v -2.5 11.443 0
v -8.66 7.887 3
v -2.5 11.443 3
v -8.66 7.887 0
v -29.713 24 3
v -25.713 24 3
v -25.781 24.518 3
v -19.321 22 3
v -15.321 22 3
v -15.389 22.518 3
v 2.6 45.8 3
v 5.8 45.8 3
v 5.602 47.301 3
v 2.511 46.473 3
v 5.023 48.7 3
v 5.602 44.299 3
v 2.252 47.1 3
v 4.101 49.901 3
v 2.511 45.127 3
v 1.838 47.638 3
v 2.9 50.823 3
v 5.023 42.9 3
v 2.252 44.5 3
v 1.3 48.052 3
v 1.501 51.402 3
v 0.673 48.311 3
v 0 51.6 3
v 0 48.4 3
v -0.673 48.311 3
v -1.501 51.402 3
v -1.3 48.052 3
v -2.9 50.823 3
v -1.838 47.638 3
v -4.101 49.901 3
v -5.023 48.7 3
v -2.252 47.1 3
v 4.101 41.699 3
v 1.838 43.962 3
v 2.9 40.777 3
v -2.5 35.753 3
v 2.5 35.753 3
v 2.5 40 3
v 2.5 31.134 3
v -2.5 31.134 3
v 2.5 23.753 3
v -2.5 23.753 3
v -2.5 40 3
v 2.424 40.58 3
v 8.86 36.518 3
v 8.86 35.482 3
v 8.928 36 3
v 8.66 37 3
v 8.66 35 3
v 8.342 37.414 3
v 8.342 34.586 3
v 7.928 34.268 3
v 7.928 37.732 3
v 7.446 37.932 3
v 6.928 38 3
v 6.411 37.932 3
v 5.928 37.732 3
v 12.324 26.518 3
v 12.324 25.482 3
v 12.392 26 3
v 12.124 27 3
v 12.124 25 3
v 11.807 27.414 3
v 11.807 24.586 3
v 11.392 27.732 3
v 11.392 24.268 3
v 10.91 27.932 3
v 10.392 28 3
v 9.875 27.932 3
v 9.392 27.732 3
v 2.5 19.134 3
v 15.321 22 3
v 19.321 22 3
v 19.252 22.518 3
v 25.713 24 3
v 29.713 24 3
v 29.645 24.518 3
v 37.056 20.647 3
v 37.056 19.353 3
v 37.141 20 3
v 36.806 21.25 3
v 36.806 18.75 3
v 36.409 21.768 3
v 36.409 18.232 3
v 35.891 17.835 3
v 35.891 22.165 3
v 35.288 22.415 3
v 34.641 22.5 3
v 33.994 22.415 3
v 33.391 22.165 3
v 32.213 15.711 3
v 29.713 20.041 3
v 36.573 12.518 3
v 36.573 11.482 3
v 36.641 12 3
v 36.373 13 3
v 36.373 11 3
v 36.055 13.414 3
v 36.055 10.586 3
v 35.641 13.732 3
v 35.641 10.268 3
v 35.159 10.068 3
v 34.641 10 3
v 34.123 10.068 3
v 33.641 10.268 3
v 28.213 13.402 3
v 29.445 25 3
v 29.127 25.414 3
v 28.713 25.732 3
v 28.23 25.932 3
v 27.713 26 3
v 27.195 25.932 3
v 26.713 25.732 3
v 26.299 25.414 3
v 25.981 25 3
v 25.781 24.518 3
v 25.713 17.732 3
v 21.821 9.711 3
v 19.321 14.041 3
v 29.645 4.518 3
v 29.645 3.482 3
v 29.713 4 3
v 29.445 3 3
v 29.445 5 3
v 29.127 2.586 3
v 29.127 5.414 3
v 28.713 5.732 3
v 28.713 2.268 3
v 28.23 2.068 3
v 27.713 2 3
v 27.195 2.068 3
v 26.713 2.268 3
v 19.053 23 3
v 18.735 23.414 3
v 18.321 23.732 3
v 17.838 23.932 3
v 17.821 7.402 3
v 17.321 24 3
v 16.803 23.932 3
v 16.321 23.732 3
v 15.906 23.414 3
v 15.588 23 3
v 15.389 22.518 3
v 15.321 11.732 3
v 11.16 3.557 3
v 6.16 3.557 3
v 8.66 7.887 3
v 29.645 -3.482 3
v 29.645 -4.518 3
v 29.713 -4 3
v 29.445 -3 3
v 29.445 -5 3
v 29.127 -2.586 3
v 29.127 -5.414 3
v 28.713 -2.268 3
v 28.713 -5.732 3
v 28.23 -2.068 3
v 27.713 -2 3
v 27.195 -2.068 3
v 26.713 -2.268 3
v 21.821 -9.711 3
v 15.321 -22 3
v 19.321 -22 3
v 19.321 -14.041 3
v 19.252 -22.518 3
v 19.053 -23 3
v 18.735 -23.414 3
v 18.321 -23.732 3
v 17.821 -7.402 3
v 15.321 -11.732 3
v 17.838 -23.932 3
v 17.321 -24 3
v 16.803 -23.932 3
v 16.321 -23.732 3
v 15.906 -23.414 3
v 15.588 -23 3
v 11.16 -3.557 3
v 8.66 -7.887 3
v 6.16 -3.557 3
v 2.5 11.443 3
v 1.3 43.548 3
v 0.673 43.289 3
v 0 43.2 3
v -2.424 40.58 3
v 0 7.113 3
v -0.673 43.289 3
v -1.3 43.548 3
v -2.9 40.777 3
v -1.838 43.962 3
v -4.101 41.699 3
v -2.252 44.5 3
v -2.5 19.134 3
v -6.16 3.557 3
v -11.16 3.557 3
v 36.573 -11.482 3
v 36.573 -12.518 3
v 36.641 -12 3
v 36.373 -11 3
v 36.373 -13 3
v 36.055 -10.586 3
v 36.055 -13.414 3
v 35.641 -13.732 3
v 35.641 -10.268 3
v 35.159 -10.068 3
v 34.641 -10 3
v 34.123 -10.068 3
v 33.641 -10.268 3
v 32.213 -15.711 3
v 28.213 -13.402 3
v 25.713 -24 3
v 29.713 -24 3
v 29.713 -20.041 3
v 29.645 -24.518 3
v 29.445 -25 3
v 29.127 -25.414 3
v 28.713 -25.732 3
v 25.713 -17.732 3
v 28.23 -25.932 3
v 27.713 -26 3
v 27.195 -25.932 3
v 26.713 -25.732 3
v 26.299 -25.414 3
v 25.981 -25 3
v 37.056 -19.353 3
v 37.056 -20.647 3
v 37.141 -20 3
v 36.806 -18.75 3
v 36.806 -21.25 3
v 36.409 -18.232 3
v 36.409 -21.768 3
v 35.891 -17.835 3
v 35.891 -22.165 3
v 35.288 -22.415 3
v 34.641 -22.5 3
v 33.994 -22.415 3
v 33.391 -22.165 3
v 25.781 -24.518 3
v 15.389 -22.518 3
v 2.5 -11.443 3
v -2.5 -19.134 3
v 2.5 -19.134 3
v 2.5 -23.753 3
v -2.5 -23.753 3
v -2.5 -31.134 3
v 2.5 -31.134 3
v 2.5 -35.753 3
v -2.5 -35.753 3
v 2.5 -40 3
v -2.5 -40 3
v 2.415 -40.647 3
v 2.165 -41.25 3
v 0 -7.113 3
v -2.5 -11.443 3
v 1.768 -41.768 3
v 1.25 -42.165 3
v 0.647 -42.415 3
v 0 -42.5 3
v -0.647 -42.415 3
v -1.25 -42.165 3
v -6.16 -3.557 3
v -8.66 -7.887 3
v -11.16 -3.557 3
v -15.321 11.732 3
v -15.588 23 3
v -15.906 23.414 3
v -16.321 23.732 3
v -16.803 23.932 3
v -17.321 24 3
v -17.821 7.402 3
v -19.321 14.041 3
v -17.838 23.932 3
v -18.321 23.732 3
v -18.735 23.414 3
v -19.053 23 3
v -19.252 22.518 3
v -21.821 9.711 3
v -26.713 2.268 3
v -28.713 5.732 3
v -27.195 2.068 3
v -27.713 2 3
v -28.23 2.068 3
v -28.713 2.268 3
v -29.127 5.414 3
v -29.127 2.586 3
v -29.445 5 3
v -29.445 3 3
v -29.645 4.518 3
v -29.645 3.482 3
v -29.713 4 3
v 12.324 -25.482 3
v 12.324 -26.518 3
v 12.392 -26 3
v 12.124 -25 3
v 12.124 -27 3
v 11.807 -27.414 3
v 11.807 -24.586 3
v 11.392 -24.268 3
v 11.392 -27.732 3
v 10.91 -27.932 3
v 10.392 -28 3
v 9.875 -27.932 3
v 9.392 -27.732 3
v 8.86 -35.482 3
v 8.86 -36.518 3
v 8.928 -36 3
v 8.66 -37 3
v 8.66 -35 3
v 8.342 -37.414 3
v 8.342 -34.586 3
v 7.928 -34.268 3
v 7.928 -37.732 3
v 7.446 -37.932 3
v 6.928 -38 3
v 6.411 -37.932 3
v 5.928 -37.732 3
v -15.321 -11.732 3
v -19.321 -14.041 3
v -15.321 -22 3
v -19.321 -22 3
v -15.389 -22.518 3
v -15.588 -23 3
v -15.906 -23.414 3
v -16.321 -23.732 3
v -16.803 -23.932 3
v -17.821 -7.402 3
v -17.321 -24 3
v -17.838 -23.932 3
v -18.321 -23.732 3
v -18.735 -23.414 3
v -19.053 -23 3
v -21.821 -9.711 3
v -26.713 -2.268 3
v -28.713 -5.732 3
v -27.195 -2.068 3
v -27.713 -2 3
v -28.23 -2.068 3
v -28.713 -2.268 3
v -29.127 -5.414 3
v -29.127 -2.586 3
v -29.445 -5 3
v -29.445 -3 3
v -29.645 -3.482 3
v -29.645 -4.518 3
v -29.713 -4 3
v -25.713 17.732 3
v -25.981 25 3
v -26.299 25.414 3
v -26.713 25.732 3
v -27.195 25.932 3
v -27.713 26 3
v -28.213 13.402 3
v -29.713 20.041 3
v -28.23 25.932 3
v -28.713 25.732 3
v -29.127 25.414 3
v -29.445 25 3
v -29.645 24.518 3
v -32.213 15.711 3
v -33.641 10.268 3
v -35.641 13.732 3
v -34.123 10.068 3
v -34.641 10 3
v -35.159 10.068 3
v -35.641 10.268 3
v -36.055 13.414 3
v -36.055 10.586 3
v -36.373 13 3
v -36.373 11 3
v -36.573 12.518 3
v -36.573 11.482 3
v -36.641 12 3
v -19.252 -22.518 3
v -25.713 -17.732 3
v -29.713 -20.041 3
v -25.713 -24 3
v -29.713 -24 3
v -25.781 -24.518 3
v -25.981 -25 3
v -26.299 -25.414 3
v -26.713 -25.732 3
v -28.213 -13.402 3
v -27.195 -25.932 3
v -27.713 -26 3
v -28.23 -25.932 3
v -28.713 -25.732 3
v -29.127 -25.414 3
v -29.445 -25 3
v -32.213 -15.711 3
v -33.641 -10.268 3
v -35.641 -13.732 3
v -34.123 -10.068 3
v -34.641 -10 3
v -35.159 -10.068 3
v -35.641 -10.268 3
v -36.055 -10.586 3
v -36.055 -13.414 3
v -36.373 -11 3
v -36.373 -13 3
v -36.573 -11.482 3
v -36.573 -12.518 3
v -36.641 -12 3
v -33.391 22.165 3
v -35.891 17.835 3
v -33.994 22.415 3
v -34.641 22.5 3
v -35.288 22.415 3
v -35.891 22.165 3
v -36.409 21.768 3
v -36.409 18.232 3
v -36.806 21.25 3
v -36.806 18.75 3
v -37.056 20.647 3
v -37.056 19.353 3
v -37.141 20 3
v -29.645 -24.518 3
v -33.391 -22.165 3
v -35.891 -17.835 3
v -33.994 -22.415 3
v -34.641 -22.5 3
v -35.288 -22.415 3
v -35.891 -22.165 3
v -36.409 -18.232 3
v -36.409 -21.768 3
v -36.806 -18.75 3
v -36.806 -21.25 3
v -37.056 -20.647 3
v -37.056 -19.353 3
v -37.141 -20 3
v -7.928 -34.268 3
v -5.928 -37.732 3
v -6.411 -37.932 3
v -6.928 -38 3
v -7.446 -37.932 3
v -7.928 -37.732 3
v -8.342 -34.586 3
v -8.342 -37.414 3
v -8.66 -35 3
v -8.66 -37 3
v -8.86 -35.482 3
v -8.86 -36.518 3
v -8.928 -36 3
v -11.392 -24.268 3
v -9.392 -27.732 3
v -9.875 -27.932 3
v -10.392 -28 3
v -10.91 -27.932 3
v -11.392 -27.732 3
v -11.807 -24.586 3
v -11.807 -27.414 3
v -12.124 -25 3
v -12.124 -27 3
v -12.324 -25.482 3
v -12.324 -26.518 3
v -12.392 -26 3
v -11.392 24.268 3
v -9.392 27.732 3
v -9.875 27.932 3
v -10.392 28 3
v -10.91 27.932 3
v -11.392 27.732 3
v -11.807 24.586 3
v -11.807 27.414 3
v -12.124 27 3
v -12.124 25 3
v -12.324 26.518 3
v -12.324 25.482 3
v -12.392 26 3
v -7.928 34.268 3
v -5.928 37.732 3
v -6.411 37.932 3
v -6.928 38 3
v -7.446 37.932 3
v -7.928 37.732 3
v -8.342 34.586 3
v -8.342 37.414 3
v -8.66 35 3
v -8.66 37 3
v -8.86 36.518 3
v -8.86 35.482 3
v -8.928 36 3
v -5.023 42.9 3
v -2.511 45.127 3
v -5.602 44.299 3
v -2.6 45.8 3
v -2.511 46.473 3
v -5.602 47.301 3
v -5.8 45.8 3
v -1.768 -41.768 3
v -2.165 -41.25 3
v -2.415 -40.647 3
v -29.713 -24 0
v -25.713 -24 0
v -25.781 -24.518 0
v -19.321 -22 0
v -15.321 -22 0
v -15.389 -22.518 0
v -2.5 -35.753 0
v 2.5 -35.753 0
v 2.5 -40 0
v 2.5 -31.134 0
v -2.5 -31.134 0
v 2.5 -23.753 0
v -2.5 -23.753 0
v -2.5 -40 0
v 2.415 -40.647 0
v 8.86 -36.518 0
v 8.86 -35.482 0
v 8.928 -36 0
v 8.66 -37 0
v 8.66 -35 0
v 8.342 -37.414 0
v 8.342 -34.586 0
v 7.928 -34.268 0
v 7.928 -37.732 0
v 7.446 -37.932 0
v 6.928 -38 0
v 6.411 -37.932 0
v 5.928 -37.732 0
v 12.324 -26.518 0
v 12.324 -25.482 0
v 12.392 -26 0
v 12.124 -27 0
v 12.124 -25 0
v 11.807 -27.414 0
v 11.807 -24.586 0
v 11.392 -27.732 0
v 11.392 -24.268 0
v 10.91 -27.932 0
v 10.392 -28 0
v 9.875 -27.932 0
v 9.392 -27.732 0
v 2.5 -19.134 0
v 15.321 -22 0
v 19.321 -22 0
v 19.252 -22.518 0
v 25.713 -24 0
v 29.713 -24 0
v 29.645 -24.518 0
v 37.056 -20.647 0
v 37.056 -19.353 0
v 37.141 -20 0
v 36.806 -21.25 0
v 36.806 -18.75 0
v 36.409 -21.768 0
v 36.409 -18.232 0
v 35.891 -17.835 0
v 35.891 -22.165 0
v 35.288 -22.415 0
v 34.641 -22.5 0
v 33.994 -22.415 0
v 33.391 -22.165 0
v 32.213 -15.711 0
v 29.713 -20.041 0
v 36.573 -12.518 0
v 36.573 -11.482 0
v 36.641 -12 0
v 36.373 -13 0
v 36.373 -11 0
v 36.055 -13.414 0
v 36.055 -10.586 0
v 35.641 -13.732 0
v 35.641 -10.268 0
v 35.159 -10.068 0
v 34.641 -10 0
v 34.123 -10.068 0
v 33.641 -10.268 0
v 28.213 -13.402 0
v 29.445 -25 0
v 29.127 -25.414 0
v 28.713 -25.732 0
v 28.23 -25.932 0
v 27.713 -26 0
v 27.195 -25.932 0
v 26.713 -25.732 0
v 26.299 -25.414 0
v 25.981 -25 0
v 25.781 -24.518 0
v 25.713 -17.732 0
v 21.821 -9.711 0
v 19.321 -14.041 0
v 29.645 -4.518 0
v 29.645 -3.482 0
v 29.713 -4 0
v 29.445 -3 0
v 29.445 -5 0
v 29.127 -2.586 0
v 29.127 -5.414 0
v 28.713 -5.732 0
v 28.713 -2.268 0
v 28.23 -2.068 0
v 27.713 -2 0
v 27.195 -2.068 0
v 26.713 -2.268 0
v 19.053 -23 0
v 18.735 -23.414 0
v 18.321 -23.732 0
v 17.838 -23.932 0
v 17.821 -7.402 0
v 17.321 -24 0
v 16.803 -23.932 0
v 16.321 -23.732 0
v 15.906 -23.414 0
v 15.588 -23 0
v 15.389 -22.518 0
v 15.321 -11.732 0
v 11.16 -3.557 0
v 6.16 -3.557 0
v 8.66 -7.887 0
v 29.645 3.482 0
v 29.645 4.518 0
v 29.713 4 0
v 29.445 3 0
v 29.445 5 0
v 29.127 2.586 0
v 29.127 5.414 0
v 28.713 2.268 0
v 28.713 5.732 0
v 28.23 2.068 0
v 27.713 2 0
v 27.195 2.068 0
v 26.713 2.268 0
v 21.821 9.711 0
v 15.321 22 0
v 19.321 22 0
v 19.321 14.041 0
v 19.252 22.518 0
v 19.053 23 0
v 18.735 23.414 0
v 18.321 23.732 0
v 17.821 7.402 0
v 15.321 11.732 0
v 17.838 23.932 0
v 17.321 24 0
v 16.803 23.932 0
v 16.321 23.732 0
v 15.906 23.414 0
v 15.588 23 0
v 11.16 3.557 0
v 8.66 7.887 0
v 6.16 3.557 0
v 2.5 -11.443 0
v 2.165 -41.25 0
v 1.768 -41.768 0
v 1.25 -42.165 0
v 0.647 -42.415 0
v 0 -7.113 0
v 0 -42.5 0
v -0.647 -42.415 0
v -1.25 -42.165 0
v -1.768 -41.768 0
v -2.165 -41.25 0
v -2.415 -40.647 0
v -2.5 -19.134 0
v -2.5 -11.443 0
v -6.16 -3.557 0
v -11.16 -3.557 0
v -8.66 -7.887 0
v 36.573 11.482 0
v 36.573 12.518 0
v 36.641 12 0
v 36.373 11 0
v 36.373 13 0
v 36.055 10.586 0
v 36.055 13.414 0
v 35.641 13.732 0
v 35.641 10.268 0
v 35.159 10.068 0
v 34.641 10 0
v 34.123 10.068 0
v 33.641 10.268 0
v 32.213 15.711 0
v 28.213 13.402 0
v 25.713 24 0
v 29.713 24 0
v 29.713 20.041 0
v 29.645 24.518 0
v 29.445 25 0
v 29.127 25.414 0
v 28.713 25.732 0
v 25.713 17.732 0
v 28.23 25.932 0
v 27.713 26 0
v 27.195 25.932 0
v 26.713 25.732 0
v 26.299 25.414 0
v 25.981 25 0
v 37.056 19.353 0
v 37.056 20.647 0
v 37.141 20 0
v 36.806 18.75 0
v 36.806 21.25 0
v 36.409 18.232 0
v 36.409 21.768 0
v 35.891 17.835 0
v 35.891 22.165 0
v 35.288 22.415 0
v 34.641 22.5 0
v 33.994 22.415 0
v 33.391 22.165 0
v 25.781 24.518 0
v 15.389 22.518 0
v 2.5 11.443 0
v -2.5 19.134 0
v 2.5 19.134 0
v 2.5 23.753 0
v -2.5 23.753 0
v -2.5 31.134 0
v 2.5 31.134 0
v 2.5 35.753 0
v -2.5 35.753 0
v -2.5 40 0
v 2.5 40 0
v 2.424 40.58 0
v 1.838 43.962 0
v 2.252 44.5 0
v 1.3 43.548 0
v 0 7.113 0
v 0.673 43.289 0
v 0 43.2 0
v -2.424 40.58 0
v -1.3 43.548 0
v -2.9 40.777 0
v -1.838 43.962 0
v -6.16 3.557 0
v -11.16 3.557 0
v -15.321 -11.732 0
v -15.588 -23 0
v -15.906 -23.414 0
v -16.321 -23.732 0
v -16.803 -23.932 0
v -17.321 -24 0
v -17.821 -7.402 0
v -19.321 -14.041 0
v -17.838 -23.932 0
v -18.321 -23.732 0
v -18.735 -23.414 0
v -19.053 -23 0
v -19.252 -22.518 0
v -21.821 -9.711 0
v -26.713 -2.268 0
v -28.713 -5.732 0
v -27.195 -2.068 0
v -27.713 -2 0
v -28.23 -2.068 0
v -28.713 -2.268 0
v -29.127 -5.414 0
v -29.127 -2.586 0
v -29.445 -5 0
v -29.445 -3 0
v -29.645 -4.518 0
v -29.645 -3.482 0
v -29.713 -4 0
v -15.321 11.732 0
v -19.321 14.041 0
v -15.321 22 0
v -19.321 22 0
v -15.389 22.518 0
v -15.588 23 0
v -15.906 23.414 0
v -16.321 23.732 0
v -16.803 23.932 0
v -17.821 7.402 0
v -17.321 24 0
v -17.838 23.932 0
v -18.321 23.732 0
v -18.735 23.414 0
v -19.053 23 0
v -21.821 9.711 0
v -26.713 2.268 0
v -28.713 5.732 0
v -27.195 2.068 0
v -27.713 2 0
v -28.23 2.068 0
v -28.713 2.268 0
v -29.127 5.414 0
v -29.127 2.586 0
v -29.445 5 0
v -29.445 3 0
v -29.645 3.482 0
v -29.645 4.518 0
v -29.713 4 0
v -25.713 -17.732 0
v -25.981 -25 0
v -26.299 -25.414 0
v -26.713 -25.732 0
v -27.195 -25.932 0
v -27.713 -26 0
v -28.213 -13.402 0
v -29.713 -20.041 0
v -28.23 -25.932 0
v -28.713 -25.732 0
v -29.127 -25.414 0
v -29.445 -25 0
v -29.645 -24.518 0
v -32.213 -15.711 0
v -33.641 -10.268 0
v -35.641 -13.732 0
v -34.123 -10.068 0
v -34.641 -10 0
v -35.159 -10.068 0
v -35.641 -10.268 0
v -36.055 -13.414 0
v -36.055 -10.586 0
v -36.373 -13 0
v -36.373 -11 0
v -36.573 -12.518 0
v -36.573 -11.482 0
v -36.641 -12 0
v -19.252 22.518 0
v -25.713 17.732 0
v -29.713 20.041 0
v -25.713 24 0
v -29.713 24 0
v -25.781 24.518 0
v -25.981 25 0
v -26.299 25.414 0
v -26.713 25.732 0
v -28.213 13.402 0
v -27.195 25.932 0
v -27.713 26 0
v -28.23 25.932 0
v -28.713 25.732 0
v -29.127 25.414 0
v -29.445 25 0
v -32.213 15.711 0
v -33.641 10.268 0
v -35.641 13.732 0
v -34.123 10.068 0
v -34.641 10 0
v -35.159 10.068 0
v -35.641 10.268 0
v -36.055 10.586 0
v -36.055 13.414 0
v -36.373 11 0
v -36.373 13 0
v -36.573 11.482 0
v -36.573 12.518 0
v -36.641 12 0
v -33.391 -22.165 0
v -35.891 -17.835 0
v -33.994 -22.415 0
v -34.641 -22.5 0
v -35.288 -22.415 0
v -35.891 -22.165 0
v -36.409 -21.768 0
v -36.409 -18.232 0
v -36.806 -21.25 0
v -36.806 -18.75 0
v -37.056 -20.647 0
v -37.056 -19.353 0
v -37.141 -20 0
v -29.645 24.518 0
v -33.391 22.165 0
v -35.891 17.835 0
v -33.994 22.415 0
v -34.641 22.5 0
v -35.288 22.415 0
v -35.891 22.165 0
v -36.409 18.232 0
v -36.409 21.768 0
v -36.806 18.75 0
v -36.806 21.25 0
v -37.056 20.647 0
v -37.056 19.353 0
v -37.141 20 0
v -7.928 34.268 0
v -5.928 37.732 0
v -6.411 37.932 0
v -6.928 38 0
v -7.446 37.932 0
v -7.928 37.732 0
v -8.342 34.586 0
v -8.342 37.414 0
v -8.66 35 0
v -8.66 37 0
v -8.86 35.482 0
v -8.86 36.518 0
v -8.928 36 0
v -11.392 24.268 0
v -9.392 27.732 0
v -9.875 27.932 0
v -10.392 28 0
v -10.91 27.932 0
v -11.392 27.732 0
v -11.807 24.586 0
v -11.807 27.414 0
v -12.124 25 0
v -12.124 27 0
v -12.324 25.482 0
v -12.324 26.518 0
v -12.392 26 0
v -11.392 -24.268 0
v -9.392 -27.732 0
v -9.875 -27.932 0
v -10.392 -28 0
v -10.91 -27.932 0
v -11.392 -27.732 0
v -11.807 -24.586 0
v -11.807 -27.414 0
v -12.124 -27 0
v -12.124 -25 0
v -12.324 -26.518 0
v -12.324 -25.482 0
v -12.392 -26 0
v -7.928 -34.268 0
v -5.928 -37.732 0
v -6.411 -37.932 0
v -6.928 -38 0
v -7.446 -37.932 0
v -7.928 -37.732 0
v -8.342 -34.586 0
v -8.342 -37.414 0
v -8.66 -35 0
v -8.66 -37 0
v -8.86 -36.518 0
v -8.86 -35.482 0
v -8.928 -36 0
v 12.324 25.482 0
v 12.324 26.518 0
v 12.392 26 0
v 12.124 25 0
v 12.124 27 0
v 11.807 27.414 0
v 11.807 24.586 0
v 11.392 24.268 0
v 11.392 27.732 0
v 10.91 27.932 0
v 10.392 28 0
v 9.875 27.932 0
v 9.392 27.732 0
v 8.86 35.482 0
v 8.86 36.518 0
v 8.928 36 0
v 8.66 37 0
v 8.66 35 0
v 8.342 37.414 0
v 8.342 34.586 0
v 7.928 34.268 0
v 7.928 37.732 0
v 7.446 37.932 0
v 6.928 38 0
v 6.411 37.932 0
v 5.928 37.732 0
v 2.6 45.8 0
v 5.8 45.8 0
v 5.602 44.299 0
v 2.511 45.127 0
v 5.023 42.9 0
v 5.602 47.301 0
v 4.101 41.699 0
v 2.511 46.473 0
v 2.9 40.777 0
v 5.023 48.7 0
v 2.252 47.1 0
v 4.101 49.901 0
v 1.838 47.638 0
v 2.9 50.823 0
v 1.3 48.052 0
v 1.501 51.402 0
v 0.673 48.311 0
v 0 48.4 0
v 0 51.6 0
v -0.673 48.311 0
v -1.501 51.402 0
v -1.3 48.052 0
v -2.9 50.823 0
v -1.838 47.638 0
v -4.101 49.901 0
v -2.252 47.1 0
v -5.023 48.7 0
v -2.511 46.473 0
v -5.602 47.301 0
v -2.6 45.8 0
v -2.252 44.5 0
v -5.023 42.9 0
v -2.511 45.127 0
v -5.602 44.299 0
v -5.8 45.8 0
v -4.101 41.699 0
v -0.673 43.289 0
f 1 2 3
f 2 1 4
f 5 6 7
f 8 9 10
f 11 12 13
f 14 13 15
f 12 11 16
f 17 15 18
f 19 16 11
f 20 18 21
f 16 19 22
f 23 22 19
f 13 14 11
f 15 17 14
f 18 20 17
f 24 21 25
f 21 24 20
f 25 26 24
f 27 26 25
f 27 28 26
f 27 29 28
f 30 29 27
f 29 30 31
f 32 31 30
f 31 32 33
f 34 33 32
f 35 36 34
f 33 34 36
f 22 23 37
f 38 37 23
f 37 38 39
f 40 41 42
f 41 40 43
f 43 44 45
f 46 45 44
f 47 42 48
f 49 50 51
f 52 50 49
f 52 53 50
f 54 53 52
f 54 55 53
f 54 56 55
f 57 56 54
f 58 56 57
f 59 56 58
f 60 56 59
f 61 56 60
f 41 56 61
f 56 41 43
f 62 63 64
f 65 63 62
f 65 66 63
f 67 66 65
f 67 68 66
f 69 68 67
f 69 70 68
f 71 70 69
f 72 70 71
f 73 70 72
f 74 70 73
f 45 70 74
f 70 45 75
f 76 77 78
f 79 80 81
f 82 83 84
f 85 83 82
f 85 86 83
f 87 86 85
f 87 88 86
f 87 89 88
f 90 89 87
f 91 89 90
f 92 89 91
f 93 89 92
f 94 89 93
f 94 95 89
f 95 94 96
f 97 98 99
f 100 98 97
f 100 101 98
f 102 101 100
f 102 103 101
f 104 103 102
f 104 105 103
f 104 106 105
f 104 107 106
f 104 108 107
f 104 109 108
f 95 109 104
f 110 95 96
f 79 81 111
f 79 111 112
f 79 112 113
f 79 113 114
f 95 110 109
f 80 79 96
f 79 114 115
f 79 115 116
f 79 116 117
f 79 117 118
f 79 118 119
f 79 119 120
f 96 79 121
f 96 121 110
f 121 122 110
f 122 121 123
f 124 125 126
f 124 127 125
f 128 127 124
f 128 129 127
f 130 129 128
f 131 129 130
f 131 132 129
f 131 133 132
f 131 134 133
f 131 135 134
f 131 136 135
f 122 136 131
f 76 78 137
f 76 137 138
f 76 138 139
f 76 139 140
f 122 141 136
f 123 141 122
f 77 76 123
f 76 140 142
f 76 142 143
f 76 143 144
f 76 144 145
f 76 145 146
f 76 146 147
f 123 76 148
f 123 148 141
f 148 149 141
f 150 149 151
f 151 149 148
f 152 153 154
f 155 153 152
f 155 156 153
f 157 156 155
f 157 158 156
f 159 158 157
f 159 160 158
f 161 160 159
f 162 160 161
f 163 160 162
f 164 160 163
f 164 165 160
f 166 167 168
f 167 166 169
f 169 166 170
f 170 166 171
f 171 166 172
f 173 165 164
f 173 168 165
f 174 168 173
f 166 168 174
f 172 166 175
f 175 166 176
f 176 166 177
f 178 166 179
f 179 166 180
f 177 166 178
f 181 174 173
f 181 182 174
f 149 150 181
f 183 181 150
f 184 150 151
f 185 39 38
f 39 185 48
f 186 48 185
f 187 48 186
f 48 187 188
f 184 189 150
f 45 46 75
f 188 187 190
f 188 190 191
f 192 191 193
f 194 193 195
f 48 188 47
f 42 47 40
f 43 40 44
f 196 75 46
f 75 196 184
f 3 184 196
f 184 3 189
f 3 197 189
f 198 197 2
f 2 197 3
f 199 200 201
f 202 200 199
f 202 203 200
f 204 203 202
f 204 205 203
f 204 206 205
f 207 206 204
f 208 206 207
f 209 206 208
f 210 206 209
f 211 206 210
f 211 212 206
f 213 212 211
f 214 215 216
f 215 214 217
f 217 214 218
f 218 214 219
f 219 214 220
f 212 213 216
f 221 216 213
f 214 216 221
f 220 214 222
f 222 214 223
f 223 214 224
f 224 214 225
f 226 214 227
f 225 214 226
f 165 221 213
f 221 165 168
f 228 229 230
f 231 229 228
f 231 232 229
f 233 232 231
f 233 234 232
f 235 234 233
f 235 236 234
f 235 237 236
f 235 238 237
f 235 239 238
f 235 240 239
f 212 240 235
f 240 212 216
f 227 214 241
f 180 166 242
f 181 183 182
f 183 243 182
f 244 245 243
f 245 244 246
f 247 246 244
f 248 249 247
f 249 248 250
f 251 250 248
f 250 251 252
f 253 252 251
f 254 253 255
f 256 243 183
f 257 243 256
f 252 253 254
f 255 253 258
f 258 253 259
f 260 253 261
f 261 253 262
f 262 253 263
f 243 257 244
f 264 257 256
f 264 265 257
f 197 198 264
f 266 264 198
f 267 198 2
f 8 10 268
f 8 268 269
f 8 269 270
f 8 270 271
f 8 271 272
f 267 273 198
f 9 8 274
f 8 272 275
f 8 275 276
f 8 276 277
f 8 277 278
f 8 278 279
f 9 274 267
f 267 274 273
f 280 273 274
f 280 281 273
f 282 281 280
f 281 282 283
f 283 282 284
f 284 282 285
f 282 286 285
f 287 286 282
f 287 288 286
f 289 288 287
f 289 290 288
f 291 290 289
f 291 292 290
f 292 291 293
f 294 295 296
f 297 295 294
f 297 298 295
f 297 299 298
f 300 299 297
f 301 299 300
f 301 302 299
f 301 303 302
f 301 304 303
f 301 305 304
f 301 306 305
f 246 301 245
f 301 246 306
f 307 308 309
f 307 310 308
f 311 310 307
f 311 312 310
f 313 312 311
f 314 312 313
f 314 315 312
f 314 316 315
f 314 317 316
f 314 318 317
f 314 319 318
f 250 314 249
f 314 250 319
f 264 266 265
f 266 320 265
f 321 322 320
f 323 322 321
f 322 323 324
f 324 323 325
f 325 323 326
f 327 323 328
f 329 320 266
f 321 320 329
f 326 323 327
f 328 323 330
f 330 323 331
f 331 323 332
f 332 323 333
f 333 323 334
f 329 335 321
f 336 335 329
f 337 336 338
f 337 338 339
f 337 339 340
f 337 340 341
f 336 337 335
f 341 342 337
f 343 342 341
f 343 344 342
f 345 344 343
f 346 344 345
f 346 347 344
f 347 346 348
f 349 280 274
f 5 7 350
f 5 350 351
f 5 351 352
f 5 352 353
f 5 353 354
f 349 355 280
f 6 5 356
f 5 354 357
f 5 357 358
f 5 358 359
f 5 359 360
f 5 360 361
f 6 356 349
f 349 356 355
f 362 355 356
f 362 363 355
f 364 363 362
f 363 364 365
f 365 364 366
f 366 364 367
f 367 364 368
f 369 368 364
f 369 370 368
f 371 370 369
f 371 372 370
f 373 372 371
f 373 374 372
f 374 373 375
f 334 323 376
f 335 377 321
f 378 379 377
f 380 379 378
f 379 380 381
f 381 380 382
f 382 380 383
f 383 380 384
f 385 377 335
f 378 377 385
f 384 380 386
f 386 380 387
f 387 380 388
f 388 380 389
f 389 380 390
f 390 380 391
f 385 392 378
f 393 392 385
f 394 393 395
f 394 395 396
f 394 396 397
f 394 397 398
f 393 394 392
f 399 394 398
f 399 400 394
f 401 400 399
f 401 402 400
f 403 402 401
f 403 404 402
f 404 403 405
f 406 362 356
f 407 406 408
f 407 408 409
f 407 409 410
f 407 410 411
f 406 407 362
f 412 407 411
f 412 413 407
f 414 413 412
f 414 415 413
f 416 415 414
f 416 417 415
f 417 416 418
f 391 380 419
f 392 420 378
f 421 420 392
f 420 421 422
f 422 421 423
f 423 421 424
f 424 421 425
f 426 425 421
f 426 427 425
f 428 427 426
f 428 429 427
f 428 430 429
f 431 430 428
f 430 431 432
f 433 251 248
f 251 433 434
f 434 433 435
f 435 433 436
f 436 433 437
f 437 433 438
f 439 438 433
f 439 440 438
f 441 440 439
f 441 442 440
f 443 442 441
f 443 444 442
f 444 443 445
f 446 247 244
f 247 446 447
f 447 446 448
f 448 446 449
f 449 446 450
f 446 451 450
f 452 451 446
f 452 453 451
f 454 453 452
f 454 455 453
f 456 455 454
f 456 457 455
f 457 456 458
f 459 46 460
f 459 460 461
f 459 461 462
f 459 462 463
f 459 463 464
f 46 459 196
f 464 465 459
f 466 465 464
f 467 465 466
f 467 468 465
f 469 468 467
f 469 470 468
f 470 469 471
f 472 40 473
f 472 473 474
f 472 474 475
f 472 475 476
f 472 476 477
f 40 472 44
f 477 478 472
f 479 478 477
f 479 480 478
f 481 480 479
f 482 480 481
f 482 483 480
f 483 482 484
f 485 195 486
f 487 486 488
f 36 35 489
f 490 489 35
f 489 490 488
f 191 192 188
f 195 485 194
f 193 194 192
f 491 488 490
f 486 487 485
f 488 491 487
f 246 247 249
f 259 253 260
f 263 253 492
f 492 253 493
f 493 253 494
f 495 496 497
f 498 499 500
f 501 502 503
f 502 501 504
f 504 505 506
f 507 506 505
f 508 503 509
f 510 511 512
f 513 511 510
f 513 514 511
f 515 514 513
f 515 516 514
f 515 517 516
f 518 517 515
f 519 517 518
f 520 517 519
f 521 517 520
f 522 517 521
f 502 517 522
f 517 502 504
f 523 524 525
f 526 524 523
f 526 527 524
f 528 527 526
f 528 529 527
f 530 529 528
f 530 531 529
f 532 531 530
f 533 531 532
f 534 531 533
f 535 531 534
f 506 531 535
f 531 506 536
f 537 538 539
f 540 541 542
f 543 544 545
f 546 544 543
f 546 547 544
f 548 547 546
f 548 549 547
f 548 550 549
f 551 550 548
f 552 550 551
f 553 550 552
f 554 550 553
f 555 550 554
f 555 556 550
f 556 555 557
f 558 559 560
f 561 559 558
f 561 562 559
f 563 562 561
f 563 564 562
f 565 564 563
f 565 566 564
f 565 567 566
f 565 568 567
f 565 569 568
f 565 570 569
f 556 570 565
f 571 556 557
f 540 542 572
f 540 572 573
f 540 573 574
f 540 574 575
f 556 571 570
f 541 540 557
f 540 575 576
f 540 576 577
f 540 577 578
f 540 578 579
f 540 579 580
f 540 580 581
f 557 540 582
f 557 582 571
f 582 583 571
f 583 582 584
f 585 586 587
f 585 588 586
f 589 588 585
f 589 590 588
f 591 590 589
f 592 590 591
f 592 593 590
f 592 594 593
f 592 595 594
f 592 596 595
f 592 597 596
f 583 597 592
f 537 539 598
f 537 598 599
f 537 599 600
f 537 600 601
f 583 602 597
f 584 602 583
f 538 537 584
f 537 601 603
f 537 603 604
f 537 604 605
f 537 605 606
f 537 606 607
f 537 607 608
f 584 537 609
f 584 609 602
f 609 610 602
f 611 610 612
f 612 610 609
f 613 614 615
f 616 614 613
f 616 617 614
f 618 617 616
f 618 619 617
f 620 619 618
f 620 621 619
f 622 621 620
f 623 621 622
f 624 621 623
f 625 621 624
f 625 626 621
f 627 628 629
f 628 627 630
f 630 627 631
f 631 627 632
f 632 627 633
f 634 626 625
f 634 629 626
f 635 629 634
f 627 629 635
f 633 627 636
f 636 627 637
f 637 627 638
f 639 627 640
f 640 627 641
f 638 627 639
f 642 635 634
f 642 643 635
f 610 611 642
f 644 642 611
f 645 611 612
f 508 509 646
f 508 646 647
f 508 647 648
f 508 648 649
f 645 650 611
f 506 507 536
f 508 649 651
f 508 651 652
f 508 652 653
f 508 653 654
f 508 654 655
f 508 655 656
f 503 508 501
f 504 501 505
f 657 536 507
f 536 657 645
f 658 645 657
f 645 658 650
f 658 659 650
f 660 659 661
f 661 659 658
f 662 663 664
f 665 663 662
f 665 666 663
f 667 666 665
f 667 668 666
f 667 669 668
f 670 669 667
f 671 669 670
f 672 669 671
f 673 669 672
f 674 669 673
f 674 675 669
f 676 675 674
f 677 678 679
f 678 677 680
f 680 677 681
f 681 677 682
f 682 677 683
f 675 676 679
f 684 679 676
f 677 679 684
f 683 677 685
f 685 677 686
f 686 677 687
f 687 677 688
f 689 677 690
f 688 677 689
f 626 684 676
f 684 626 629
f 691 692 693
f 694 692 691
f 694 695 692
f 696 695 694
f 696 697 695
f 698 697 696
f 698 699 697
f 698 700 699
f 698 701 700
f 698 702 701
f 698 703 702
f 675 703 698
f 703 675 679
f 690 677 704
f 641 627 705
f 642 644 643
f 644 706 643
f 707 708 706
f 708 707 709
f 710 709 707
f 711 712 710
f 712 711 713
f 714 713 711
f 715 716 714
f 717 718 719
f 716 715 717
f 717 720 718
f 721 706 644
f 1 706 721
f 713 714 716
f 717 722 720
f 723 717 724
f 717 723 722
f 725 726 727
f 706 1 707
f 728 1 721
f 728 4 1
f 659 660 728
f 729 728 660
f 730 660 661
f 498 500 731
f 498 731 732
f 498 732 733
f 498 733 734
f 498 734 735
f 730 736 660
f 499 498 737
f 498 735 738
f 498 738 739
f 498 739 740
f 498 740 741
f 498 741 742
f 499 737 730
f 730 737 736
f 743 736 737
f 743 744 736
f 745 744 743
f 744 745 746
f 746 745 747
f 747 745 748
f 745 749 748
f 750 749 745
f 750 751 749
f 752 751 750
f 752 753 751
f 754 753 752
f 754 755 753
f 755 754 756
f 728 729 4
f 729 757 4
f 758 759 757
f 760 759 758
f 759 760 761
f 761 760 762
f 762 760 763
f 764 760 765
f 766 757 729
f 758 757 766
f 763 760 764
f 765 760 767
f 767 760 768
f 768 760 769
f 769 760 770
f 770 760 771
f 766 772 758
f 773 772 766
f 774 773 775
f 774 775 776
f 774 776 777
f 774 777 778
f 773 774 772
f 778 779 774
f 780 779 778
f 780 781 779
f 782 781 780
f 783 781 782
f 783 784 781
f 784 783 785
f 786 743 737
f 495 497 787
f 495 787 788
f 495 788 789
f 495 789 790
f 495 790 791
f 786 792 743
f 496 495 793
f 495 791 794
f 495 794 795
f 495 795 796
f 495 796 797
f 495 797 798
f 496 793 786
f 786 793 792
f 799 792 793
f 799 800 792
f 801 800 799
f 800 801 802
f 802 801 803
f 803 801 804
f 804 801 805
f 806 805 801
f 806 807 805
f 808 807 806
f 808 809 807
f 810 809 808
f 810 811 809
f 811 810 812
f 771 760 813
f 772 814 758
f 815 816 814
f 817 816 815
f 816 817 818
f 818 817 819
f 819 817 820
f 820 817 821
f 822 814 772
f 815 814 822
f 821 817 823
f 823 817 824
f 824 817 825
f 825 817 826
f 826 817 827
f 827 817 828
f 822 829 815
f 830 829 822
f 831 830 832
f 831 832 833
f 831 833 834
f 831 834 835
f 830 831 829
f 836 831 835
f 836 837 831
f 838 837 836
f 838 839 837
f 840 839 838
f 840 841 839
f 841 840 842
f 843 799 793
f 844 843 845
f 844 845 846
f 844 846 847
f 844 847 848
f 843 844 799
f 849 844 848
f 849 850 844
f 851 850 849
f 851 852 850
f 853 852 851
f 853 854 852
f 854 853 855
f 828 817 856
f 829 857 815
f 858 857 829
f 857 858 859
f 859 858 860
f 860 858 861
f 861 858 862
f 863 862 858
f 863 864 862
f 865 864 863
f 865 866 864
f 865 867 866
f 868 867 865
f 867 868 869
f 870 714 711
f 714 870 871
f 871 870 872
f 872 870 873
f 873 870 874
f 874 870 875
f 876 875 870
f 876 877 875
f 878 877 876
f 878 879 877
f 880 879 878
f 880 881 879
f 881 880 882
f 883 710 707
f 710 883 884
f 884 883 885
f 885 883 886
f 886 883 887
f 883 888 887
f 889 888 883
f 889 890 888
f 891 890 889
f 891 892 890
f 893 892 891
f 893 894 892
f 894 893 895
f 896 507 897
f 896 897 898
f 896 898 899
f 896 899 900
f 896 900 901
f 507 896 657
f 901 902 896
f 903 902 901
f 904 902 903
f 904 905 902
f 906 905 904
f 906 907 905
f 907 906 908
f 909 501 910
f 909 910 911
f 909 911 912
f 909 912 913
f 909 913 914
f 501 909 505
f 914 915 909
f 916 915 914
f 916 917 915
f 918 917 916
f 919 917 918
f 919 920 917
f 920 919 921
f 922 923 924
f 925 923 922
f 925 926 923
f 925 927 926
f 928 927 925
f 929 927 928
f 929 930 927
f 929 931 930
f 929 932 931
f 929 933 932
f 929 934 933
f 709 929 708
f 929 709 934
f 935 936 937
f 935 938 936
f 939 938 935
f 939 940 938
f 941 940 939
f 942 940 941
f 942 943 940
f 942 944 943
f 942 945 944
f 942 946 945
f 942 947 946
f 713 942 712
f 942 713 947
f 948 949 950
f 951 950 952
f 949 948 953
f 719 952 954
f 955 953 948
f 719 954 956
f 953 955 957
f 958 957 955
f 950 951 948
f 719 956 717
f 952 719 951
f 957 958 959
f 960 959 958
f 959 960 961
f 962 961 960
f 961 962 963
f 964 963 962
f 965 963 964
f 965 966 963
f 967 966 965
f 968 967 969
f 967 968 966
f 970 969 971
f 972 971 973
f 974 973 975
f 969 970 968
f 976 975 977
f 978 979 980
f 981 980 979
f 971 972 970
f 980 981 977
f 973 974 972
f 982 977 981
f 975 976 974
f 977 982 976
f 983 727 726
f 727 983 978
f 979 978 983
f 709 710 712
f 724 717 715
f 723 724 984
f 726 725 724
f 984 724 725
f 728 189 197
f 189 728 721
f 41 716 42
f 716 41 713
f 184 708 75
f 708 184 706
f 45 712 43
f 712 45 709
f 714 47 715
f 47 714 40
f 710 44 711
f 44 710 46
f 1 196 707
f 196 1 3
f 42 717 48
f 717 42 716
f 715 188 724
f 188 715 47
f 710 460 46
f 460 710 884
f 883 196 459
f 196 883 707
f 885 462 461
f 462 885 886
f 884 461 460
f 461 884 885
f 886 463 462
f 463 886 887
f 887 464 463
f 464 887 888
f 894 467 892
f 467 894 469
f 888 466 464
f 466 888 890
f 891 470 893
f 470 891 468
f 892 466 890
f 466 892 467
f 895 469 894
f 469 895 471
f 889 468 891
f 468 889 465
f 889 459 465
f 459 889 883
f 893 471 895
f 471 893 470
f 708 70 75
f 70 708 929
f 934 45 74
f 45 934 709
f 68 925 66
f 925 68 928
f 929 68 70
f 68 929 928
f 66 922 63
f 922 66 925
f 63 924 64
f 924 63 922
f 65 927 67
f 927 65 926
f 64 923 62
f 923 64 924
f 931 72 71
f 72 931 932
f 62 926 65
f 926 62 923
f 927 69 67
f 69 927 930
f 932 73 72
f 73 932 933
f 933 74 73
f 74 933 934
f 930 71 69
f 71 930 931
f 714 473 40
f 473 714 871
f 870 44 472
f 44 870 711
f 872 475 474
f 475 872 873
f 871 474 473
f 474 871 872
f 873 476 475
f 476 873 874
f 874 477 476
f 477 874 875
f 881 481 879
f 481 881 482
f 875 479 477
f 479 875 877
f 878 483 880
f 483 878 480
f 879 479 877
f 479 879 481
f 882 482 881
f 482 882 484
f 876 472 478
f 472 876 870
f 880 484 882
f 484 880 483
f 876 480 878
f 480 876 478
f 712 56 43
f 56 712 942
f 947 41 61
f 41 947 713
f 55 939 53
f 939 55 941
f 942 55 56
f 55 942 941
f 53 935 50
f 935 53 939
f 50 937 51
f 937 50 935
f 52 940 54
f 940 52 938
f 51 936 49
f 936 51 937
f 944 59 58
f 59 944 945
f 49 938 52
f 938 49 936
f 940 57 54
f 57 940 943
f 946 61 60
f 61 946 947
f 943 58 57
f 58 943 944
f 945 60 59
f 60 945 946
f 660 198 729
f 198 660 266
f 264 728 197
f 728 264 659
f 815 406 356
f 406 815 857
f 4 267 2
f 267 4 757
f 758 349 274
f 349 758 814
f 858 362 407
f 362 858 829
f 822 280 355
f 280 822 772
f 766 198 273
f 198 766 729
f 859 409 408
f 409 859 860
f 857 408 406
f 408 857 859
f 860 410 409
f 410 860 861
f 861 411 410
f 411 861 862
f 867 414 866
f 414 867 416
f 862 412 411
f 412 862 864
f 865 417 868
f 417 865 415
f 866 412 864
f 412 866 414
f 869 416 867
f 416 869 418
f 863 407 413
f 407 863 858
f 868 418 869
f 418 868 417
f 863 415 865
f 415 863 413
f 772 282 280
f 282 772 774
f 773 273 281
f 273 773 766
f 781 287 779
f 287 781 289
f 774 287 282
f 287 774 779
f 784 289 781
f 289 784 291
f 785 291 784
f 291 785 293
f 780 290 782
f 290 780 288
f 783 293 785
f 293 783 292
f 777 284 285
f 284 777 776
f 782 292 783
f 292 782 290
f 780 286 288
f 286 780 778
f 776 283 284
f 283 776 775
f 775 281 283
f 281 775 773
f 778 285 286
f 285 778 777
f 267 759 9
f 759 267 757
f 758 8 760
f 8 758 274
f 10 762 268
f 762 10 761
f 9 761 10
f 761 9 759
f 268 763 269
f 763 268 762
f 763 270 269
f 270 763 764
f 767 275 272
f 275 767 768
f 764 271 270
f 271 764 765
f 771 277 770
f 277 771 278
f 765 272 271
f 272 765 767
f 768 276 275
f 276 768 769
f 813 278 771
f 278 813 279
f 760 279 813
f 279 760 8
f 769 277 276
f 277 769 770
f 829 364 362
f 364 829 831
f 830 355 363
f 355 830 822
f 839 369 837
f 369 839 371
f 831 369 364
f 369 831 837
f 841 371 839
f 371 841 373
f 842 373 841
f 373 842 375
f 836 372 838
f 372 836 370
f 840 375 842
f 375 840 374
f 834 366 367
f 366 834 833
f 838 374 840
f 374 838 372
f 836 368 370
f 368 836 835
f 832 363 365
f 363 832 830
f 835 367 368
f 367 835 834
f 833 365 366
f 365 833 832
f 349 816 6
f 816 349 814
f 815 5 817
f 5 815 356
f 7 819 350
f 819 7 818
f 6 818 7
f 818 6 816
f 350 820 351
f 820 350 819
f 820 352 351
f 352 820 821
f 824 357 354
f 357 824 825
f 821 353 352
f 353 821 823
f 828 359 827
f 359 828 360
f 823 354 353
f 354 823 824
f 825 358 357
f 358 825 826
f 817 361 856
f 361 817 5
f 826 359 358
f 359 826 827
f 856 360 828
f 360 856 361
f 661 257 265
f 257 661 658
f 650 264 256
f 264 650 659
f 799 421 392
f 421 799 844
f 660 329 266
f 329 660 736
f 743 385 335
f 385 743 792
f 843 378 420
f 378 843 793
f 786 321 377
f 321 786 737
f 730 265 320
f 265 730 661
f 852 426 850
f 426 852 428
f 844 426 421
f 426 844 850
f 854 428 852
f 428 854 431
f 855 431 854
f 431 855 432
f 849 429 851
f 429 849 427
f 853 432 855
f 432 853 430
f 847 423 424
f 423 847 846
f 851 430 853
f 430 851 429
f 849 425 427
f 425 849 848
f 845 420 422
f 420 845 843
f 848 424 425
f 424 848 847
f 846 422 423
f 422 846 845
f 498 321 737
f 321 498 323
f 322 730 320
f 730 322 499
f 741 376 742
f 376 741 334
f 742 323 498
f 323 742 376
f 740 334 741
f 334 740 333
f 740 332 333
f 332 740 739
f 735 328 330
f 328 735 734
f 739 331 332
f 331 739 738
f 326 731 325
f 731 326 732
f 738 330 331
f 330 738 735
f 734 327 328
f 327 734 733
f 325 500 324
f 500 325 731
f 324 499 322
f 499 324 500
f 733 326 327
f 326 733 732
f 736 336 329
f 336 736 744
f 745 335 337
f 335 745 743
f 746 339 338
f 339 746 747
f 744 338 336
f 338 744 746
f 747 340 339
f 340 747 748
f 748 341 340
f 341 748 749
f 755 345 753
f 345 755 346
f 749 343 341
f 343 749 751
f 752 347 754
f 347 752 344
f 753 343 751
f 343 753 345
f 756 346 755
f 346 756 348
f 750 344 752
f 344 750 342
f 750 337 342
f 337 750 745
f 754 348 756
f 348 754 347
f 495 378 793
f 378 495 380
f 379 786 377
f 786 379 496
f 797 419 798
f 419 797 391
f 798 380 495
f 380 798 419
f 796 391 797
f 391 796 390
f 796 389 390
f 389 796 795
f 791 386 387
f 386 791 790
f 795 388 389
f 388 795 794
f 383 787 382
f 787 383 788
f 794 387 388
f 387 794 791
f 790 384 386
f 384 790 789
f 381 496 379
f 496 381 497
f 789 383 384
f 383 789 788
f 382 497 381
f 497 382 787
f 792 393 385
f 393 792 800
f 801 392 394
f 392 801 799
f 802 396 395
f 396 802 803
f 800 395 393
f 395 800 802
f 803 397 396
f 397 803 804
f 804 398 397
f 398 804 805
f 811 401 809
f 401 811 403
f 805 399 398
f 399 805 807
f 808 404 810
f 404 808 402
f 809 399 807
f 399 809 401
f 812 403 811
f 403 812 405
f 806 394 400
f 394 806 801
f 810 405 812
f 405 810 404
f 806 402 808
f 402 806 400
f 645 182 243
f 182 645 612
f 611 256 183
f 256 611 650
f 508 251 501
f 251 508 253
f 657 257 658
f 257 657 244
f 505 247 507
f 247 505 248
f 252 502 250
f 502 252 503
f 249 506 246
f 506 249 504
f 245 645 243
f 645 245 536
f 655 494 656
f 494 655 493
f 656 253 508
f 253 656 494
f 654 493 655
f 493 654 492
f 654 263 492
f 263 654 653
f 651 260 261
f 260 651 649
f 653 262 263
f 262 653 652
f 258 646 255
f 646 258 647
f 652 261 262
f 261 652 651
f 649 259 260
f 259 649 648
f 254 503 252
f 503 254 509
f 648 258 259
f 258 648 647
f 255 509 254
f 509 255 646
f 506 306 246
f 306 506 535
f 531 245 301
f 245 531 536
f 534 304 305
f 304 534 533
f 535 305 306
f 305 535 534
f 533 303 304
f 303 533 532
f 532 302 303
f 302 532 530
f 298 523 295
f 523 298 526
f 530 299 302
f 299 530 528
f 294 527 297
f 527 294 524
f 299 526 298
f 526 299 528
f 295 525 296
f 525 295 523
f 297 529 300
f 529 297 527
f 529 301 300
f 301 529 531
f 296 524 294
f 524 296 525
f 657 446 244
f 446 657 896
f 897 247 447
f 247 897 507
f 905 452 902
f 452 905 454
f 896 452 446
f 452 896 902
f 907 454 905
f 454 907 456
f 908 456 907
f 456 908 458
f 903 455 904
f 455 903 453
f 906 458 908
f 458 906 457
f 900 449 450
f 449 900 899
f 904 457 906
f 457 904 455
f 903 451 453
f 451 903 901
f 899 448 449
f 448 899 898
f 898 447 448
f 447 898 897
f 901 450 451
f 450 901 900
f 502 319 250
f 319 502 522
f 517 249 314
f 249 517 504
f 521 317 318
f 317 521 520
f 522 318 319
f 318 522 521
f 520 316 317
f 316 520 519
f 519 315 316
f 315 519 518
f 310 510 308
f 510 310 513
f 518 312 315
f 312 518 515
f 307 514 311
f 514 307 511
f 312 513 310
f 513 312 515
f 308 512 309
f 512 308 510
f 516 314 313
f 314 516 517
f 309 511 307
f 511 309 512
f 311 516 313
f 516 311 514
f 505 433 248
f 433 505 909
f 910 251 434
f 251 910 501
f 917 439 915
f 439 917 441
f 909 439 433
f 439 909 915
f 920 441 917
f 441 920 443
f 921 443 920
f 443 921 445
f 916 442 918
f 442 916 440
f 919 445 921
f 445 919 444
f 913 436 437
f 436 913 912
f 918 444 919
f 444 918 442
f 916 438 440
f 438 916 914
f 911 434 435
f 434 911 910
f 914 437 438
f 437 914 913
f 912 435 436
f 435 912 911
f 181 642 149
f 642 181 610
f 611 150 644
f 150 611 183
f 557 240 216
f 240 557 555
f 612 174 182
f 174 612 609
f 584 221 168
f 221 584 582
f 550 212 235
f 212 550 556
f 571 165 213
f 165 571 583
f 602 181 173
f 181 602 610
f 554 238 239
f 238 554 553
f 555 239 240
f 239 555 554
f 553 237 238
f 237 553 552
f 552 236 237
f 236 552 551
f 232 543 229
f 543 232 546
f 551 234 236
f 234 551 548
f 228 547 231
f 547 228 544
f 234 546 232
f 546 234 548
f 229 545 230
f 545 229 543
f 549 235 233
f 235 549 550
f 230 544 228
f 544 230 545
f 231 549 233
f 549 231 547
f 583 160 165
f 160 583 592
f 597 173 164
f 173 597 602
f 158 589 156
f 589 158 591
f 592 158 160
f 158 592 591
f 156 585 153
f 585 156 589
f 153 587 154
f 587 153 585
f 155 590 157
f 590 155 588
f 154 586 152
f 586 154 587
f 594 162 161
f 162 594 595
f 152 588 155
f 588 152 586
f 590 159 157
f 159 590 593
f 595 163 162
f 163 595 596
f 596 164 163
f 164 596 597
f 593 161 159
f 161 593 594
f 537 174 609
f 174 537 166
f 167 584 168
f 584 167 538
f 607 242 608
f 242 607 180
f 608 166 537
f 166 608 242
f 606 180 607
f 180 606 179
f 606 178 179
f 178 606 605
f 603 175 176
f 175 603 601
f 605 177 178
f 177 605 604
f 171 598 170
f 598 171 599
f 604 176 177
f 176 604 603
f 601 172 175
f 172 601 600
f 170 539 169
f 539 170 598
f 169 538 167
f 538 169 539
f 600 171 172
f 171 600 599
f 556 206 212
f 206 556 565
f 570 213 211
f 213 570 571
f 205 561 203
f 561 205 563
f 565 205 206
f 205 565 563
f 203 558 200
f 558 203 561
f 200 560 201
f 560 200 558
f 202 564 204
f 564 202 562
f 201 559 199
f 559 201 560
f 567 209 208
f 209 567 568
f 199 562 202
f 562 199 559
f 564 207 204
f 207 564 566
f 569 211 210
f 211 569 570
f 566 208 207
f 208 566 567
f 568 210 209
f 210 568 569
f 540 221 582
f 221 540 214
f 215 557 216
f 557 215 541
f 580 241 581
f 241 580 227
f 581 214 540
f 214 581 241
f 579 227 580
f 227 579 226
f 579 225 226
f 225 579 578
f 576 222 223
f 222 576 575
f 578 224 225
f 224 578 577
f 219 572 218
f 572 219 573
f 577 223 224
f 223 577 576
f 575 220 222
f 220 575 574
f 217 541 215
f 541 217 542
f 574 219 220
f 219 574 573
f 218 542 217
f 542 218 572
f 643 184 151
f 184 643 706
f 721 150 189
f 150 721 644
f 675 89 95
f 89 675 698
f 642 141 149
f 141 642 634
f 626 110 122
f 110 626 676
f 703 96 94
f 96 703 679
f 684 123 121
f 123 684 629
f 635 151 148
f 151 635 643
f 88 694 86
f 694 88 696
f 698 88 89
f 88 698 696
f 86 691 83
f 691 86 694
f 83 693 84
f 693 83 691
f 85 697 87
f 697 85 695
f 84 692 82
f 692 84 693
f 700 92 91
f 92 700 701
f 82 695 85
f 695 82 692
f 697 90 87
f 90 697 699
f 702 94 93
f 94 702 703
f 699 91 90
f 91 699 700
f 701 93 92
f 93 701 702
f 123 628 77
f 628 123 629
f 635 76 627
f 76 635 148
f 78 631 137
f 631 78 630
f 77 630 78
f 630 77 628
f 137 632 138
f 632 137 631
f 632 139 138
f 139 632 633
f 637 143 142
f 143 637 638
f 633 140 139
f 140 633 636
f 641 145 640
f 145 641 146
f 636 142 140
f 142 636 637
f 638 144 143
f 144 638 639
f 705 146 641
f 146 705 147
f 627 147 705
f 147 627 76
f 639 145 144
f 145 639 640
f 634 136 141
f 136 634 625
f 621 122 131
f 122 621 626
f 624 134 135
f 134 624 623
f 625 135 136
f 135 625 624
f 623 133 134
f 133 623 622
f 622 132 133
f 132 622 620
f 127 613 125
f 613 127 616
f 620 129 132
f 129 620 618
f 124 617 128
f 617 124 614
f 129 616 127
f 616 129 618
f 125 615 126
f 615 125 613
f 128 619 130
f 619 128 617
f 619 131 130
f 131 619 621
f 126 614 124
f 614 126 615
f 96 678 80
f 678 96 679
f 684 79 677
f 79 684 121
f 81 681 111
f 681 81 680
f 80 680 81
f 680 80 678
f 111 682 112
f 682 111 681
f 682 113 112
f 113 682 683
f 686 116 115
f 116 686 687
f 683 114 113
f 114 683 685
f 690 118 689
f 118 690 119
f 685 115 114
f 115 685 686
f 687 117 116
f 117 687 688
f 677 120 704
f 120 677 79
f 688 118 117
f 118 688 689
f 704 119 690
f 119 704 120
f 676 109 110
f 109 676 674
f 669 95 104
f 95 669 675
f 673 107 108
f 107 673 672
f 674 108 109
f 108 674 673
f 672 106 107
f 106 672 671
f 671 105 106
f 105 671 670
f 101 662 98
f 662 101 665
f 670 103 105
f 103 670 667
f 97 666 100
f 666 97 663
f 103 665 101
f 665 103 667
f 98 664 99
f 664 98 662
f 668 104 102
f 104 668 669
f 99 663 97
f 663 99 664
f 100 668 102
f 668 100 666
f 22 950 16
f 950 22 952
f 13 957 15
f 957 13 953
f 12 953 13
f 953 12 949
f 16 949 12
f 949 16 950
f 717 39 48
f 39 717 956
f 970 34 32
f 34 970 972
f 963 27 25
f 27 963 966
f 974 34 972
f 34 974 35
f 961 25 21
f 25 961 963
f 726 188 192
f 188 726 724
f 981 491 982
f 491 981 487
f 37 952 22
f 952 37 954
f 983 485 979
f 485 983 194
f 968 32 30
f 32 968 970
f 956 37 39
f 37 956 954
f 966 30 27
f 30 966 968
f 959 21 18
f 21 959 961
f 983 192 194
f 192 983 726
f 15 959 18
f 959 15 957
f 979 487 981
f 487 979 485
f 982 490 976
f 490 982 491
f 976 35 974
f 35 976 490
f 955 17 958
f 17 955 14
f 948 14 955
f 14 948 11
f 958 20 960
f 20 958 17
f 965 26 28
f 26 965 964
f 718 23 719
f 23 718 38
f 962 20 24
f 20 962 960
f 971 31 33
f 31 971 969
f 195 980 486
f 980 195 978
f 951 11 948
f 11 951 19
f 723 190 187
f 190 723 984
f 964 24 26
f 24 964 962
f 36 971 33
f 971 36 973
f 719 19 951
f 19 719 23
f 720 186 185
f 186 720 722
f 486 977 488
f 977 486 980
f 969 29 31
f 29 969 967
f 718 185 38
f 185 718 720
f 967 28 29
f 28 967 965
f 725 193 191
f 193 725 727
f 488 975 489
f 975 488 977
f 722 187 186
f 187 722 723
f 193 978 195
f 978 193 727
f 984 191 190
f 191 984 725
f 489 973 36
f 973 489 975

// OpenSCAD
// snowflake 3
// @author Ilya Protasov

/* TODO
? fix central figure for branch_count
*/

/* [Base] */
height = 3;
radius = 40;
hanger_type = "ring";// [ring, none]

/* [Extended] */
// coefficient of radius for central (main) branch thickness
central_thickness_coef = 0.125; // [0:0.001:0.300]
central_branch_start_coef = 0.25; // [0:0.001:1]

middle_branch_start_coef = 0.5; // [0:0.001:1]
middle_branch_length_coef = 0.3; // [0:0.001:1]
middle_thickness_coef = 0.100; // [0:0.001:0.300]

outer_branch_start_coef = 0.8; // [0:0.001:1]
outer_branch_length_coef = 0.2; // [0:0.001:1]
outer_thickness_coef = 0.100; // [0:0.001:0.300]

ring_inner_radius_coef = 0.065; // [0:0.001:0.300]
ring_thick_coef = 0.080; // [0:0.001:0.300]

/* [Quality ] */
//count of segments in arcs https://en.wikibooks.org/wiki/OpenSCAD_User_Manual/Other_Language_Features#$fa,_$fs_and_$fn
$fn = 24; 

/* [Hidden]  */
branch_count = 6;

thickMain = radius * central_thickness_coef;
middleThick = radius * middle_thickness_coef;
outerThick = radius * outer_thickness_coef;

module branchMain() {
    centralAngle = 120;//360 / branch_count * 2;
    lenHex = radius * central_branch_start_coef;
    middleStart = radius * middle_branch_start_coef;
    outerStart = radius * outer_branch_start_coef;
    
    //central hexagon
    translate([0, lenHex, 0]) rotate([0, 0, centralAngle]) branch2(thickMain, lenHex);
    
    //central branch
    translate([0, lenHex, 0]) branch2(thickMain, radius-lenHex);
    
    //middle branchs
    translate([0, middleStart, 0]) rotate([0, 0, 60]) branch2(middleThick, radius * middle_branch_length_coef);
    translate([0, middleStart, 0]) rotate([0, 0, -60]) branch2(middleThick, radius * middle_branch_length_coef);
    
    //outer branchs
    translate([0, outerStart, 0]) rotate([0, 0, 60]) branch2(outerThick, radius * outer_branch_length_coef);
    translate([0, outerStart, 0]) rotate([0, 0, -60]) branch2(outerThick, radius * outer_branch_length_coef);
}

module branch2(thick, length) {
    translate([-thick/2, 0, 0]) cube([thick, length, height], false);
    translate([0, length, 0]) cylinder(height, thick/2, thick/2, false);
}

module ring(height, outerR, innerR) {
    difference() {
        cylinder(height, outerR, outerR, true);
        cylinder(height * 2, innerR, innerR, true);
    }
}

module snowflake3(branchCount) {
    angle = 360 / branchCount;
    ringInnerRadius = radius * ring_inner_radius_coef;
    ringThick = radius * ring_thick_coef;
    for (i=[0:branchCount-1]) {
        rotate([0, 0, i * angle]) branchMain();
    }
    if (hanger_type == "ring") {
        translate([0, radius + ringInnerRadius + ringThick, height/2])
            ring(height = height, 
                 outerR = ringInnerRadius + ringThick,
                 innerR = ringInnerRadius );
    }
        
}

color("DeepSkyBlue") snowflake3(branch_count);
